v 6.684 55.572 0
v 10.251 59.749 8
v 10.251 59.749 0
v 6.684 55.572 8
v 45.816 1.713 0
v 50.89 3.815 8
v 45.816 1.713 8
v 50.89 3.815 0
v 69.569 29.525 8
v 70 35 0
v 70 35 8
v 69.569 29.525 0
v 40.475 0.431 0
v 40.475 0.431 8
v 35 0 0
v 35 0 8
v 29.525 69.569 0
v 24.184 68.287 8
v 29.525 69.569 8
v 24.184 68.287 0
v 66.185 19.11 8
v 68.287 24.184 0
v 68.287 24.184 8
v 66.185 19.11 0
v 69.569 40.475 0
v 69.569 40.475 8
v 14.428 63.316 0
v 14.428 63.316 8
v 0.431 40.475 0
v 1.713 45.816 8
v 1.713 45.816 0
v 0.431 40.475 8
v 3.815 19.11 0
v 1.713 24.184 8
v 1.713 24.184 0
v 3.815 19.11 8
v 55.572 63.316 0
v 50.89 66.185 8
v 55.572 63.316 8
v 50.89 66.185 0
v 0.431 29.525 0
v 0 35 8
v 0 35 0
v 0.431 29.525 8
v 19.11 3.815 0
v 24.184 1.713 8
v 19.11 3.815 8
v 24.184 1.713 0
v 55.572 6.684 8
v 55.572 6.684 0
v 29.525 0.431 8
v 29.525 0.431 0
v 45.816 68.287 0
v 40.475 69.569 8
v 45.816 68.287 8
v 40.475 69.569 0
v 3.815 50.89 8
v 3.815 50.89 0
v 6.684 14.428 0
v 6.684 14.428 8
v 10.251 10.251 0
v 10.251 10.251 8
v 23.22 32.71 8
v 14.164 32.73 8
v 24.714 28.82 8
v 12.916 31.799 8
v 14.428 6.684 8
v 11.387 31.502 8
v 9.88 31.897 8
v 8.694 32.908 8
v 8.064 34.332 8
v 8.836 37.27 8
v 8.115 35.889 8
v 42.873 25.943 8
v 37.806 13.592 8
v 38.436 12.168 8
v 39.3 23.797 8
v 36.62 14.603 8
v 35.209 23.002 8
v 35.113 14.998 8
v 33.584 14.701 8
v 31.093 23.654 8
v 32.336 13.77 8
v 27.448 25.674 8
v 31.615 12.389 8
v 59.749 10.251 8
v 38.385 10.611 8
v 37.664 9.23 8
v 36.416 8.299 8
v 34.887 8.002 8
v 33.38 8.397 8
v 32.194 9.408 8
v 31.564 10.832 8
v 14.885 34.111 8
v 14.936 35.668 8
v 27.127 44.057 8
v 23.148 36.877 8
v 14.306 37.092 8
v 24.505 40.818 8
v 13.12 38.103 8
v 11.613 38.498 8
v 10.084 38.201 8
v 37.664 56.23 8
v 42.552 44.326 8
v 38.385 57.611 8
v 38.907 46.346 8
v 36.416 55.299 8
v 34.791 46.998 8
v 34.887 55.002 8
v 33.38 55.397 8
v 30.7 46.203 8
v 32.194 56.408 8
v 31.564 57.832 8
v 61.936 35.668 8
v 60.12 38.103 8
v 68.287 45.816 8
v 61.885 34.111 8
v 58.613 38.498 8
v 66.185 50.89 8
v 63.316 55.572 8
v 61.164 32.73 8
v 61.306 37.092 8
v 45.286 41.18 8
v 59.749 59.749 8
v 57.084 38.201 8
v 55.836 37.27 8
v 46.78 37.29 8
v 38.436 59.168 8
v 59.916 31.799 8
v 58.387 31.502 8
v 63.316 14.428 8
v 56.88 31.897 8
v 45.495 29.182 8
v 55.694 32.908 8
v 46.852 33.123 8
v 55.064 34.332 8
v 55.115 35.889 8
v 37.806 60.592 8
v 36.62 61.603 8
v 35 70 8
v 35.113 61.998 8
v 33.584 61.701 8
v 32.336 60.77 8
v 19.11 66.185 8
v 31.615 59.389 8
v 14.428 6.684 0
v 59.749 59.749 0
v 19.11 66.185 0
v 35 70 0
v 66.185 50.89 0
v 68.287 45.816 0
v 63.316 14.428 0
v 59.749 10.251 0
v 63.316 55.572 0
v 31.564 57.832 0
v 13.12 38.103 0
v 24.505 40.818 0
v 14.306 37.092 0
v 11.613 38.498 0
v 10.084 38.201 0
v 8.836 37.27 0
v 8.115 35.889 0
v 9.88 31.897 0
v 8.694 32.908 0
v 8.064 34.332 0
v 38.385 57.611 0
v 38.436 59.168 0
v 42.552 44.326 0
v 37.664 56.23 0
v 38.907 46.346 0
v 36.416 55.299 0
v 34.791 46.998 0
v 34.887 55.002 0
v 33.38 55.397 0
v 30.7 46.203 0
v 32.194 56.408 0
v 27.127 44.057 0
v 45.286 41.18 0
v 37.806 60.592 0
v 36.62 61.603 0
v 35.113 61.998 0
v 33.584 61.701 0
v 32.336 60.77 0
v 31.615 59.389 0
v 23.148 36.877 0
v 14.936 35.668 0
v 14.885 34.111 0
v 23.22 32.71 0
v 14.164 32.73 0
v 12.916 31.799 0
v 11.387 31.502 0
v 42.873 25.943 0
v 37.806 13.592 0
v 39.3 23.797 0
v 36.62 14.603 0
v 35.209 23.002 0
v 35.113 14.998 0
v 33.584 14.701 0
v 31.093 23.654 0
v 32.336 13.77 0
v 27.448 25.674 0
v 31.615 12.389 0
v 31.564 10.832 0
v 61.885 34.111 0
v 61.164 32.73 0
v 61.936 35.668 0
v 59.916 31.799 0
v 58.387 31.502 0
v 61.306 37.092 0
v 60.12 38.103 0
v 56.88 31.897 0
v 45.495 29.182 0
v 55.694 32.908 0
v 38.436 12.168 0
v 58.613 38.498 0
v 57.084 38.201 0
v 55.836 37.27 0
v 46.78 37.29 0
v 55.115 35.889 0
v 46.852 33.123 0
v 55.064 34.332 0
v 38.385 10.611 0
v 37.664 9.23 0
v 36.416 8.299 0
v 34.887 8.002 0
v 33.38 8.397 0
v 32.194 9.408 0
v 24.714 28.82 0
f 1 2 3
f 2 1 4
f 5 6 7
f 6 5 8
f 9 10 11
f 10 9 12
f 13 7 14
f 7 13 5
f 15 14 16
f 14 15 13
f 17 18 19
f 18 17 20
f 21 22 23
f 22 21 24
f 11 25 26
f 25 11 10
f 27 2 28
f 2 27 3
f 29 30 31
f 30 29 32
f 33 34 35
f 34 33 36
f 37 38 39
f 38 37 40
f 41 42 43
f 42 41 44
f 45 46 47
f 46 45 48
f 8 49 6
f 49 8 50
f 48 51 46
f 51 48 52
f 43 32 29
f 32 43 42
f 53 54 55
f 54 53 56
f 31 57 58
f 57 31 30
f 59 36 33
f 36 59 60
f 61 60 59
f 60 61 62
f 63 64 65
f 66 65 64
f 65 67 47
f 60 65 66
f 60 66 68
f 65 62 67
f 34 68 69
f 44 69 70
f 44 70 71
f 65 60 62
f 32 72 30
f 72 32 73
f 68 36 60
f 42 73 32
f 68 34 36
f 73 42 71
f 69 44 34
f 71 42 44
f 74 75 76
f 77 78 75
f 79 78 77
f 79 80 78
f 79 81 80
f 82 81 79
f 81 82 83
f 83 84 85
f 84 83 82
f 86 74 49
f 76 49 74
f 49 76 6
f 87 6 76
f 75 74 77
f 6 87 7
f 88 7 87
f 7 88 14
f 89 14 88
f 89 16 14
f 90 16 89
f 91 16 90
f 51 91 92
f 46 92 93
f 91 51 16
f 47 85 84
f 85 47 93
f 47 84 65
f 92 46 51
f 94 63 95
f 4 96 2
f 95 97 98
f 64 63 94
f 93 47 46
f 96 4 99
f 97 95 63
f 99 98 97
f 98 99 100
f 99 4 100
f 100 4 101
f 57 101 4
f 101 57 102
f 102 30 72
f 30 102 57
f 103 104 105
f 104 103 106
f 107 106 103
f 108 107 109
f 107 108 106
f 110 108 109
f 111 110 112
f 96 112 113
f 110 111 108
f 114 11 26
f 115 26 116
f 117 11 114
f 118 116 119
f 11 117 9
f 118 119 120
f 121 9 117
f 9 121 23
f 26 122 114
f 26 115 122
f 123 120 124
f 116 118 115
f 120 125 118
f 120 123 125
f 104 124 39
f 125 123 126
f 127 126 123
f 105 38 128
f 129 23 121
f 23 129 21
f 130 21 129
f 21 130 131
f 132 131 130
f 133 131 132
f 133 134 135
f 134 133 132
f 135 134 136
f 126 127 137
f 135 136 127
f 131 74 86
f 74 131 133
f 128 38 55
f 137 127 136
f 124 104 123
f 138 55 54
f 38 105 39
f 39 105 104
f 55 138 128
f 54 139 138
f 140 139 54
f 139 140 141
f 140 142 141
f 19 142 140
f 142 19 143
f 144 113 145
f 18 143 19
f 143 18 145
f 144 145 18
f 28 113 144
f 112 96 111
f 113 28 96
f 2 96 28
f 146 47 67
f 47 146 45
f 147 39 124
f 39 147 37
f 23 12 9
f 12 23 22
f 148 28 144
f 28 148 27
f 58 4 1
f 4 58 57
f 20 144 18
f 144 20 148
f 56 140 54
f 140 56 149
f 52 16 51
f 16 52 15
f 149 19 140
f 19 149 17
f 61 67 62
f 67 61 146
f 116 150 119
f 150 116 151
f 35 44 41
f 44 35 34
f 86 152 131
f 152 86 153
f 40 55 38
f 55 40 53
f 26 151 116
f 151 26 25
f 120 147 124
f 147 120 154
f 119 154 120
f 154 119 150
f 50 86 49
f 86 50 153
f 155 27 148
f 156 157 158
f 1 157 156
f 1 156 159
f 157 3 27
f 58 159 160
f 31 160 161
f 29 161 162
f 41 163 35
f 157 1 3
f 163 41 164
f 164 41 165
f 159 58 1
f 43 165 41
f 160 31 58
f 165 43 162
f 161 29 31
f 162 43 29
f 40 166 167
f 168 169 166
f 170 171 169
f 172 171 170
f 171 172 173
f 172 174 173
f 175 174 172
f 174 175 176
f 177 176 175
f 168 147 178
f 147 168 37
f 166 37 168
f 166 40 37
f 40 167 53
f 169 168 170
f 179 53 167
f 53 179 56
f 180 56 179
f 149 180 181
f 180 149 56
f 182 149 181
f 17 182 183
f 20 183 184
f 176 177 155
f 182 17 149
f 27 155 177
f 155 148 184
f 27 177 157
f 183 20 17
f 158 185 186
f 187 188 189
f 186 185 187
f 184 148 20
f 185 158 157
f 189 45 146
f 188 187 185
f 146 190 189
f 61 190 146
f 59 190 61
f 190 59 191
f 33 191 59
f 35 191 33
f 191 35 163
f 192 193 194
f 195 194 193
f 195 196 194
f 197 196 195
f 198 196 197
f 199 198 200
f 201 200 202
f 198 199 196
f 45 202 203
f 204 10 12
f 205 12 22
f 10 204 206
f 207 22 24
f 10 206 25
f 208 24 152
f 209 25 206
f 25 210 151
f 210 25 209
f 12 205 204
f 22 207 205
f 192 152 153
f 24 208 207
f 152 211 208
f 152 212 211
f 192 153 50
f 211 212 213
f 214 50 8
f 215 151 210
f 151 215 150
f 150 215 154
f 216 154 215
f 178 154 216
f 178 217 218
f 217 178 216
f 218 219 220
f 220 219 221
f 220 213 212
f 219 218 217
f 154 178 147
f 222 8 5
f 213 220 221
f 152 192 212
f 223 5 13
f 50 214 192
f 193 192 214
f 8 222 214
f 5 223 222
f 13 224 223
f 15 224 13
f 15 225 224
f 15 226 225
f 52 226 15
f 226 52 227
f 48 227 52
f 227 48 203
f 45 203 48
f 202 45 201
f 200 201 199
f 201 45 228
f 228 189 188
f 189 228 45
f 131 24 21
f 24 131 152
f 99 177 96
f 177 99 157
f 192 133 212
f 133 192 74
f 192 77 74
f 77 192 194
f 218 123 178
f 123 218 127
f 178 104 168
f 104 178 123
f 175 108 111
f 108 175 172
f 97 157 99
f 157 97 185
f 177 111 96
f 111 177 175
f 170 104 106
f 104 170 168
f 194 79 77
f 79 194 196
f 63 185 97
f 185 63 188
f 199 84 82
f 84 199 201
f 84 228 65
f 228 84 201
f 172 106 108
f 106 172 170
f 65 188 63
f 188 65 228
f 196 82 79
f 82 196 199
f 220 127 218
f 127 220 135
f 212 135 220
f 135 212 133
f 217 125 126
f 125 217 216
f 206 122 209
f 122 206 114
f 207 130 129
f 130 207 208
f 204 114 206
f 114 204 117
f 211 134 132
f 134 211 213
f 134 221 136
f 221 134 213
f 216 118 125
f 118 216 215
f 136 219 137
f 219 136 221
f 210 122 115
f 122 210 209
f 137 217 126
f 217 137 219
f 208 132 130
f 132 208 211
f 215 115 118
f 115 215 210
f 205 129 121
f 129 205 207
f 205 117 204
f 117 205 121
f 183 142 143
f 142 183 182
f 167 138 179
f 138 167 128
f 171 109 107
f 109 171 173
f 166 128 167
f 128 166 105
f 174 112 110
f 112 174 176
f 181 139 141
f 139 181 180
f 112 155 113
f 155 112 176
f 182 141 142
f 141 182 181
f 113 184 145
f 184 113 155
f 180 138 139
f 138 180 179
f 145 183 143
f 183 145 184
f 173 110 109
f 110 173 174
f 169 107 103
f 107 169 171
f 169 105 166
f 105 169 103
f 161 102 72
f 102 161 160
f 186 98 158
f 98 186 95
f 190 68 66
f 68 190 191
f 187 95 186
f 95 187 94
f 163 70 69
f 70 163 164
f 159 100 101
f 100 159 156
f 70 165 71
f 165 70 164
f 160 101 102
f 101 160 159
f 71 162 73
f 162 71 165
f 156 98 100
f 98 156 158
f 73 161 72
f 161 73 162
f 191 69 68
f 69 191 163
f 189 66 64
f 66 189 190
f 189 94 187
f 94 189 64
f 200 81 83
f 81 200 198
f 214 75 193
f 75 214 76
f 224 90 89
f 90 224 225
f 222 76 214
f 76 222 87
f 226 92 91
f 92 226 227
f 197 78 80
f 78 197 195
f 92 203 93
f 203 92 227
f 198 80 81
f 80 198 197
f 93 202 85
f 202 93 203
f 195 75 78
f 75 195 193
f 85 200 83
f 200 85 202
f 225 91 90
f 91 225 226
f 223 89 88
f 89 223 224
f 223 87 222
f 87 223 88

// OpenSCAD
$fn = 32;

// ----------------------------------------------------------------------
// Spacer plate: round flange R35, 4 bolts
// ----------------------------------------------------------------------

// --- parameters (mm) ---
bore_r = 12;              // centre bore radius
bolt_r = 3.5;             // bolt hole radius
plate_t = 8;              // plate thickness, Z (extrusion height)
flange_r = 35;            // flange radius
n_bolt = 4;               // bolt hole count
ring_r = 23.5;            // bolt circle radius

profile = [[70, 35], [69.569, 40.475], [68.287, 45.816], [66.185, 50.89], [63.316, 55.572], [59.749, 59.749], [55.572, 63.316], [50.89, 66.185], [45.816, 68.287], [40.475, 69.569], [35, 70], [29.525, 69.569], [24.184, 68.287], [19.11, 66.185], [14.428, 63.316], [10.251, 59.749], [6.684, 55.572], [3.815, 50.89], [1.713, 45.816], [0.431, 40.475], [0, 35], [0.431, 29.525], [1.713, 24.184], [3.815, 19.11], [6.684, 14.428], [10.251, 10.251], [14.428, 6.684], [19.11, 3.815], [24.184, 1.713], [29.525, 0.431], [35, 0], [40.475, 0.431], [45.816, 1.713], [50.89, 3.815], [55.572, 6.684], [59.749, 10.251], [63.316, 14.428], [66.185, 19.11], [68.287, 24.184], [69.569, 29.525]];  // primary outline, 40 points, counter clockwise
void_1 = [[46.78, 37.29], [45.286, 41.18], [42.552, 44.326], [38.907, 46.346], [34.791, 46.998], [30.7, 46.203], [27.127, 44.057], [24.505, 40.818], [23.148, 36.877], [23.22, 32.71], [24.714, 28.82], [27.448, 25.674], [31.093, 23.654], [35.209, 23.002], [39.3, 23.797], [42.873, 25.943], [45.495, 29.182], [46.852, 33.123]];  // centre bore, 18 points
void_2 = [[61.936, 35.668], [61.306, 37.092], [60.12, 38.103], [58.613, 38.498], [57.084, 38.201], [55.836, 37.27], [55.115, 35.889], [55.064, 34.332], [55.694, 32.908], [56.88, 31.897], [58.387, 31.502], [59.916, 31.799], [61.164, 32.73], [61.885, 34.111]];  // bolt hole 1, 14 points
void_3 = [[38.436, 59.168], [37.806, 60.592], [36.62, 61.603], [35.113, 61.998], [33.584, 61.701], [32.336, 60.77], [31.615, 59.389], [31.564, 57.832], [32.194, 56.408], [33.38, 55.397], [34.887, 55.002], [36.416, 55.299], [37.664, 56.23], [38.385, 57.611]];  // bolt hole 2, 14 points
void_4 = [[14.936, 35.668], [14.306, 37.092], [13.12, 38.103], [11.613, 38.498], [10.084, 38.201], [8.836, 37.27], [8.115, 35.889], [8.064, 34.332], [8.694, 32.908], [9.88, 31.897], [11.387, 31.502], [12.916, 31.799], [14.164, 32.73], [14.885, 34.111]];  // bolt hole 3, 14 points
void_5 = [[38.436, 12.168], [37.806, 13.592], [36.62, 14.603], [35.113, 14.998], [33.584, 14.701], [32.336, 13.77], [31.615, 12.389], [31.564, 10.832], [32.194, 9.408], [33.38, 8.397], [34.887, 8.002], [36.416, 8.299], [37.664, 9.23], [38.385, 10.611]];  // bolt hole 4, 14 points

// --- the one profile operation ---
difference() {
  linear_extrude(height = plate_t) polygon(points = profile);
  translate([0, 0, -1])
    linear_extrude(height = plate_t + 2) polygon(points = void_1);
  translate([0, 0, -1])
    linear_extrude(height = plate_t + 2) polygon(points = void_2);
  translate([0, 0, -1])
    linear_extrude(height = plate_t + 2) polygon(points = void_3);
  translate([0, 0, -1])
    linear_extrude(height = plate_t + 2) polygon(points = void_4);
  translate([0, 0, -1])
    linear_extrude(height = plate_t + 2) polygon(points = void_5);
}
